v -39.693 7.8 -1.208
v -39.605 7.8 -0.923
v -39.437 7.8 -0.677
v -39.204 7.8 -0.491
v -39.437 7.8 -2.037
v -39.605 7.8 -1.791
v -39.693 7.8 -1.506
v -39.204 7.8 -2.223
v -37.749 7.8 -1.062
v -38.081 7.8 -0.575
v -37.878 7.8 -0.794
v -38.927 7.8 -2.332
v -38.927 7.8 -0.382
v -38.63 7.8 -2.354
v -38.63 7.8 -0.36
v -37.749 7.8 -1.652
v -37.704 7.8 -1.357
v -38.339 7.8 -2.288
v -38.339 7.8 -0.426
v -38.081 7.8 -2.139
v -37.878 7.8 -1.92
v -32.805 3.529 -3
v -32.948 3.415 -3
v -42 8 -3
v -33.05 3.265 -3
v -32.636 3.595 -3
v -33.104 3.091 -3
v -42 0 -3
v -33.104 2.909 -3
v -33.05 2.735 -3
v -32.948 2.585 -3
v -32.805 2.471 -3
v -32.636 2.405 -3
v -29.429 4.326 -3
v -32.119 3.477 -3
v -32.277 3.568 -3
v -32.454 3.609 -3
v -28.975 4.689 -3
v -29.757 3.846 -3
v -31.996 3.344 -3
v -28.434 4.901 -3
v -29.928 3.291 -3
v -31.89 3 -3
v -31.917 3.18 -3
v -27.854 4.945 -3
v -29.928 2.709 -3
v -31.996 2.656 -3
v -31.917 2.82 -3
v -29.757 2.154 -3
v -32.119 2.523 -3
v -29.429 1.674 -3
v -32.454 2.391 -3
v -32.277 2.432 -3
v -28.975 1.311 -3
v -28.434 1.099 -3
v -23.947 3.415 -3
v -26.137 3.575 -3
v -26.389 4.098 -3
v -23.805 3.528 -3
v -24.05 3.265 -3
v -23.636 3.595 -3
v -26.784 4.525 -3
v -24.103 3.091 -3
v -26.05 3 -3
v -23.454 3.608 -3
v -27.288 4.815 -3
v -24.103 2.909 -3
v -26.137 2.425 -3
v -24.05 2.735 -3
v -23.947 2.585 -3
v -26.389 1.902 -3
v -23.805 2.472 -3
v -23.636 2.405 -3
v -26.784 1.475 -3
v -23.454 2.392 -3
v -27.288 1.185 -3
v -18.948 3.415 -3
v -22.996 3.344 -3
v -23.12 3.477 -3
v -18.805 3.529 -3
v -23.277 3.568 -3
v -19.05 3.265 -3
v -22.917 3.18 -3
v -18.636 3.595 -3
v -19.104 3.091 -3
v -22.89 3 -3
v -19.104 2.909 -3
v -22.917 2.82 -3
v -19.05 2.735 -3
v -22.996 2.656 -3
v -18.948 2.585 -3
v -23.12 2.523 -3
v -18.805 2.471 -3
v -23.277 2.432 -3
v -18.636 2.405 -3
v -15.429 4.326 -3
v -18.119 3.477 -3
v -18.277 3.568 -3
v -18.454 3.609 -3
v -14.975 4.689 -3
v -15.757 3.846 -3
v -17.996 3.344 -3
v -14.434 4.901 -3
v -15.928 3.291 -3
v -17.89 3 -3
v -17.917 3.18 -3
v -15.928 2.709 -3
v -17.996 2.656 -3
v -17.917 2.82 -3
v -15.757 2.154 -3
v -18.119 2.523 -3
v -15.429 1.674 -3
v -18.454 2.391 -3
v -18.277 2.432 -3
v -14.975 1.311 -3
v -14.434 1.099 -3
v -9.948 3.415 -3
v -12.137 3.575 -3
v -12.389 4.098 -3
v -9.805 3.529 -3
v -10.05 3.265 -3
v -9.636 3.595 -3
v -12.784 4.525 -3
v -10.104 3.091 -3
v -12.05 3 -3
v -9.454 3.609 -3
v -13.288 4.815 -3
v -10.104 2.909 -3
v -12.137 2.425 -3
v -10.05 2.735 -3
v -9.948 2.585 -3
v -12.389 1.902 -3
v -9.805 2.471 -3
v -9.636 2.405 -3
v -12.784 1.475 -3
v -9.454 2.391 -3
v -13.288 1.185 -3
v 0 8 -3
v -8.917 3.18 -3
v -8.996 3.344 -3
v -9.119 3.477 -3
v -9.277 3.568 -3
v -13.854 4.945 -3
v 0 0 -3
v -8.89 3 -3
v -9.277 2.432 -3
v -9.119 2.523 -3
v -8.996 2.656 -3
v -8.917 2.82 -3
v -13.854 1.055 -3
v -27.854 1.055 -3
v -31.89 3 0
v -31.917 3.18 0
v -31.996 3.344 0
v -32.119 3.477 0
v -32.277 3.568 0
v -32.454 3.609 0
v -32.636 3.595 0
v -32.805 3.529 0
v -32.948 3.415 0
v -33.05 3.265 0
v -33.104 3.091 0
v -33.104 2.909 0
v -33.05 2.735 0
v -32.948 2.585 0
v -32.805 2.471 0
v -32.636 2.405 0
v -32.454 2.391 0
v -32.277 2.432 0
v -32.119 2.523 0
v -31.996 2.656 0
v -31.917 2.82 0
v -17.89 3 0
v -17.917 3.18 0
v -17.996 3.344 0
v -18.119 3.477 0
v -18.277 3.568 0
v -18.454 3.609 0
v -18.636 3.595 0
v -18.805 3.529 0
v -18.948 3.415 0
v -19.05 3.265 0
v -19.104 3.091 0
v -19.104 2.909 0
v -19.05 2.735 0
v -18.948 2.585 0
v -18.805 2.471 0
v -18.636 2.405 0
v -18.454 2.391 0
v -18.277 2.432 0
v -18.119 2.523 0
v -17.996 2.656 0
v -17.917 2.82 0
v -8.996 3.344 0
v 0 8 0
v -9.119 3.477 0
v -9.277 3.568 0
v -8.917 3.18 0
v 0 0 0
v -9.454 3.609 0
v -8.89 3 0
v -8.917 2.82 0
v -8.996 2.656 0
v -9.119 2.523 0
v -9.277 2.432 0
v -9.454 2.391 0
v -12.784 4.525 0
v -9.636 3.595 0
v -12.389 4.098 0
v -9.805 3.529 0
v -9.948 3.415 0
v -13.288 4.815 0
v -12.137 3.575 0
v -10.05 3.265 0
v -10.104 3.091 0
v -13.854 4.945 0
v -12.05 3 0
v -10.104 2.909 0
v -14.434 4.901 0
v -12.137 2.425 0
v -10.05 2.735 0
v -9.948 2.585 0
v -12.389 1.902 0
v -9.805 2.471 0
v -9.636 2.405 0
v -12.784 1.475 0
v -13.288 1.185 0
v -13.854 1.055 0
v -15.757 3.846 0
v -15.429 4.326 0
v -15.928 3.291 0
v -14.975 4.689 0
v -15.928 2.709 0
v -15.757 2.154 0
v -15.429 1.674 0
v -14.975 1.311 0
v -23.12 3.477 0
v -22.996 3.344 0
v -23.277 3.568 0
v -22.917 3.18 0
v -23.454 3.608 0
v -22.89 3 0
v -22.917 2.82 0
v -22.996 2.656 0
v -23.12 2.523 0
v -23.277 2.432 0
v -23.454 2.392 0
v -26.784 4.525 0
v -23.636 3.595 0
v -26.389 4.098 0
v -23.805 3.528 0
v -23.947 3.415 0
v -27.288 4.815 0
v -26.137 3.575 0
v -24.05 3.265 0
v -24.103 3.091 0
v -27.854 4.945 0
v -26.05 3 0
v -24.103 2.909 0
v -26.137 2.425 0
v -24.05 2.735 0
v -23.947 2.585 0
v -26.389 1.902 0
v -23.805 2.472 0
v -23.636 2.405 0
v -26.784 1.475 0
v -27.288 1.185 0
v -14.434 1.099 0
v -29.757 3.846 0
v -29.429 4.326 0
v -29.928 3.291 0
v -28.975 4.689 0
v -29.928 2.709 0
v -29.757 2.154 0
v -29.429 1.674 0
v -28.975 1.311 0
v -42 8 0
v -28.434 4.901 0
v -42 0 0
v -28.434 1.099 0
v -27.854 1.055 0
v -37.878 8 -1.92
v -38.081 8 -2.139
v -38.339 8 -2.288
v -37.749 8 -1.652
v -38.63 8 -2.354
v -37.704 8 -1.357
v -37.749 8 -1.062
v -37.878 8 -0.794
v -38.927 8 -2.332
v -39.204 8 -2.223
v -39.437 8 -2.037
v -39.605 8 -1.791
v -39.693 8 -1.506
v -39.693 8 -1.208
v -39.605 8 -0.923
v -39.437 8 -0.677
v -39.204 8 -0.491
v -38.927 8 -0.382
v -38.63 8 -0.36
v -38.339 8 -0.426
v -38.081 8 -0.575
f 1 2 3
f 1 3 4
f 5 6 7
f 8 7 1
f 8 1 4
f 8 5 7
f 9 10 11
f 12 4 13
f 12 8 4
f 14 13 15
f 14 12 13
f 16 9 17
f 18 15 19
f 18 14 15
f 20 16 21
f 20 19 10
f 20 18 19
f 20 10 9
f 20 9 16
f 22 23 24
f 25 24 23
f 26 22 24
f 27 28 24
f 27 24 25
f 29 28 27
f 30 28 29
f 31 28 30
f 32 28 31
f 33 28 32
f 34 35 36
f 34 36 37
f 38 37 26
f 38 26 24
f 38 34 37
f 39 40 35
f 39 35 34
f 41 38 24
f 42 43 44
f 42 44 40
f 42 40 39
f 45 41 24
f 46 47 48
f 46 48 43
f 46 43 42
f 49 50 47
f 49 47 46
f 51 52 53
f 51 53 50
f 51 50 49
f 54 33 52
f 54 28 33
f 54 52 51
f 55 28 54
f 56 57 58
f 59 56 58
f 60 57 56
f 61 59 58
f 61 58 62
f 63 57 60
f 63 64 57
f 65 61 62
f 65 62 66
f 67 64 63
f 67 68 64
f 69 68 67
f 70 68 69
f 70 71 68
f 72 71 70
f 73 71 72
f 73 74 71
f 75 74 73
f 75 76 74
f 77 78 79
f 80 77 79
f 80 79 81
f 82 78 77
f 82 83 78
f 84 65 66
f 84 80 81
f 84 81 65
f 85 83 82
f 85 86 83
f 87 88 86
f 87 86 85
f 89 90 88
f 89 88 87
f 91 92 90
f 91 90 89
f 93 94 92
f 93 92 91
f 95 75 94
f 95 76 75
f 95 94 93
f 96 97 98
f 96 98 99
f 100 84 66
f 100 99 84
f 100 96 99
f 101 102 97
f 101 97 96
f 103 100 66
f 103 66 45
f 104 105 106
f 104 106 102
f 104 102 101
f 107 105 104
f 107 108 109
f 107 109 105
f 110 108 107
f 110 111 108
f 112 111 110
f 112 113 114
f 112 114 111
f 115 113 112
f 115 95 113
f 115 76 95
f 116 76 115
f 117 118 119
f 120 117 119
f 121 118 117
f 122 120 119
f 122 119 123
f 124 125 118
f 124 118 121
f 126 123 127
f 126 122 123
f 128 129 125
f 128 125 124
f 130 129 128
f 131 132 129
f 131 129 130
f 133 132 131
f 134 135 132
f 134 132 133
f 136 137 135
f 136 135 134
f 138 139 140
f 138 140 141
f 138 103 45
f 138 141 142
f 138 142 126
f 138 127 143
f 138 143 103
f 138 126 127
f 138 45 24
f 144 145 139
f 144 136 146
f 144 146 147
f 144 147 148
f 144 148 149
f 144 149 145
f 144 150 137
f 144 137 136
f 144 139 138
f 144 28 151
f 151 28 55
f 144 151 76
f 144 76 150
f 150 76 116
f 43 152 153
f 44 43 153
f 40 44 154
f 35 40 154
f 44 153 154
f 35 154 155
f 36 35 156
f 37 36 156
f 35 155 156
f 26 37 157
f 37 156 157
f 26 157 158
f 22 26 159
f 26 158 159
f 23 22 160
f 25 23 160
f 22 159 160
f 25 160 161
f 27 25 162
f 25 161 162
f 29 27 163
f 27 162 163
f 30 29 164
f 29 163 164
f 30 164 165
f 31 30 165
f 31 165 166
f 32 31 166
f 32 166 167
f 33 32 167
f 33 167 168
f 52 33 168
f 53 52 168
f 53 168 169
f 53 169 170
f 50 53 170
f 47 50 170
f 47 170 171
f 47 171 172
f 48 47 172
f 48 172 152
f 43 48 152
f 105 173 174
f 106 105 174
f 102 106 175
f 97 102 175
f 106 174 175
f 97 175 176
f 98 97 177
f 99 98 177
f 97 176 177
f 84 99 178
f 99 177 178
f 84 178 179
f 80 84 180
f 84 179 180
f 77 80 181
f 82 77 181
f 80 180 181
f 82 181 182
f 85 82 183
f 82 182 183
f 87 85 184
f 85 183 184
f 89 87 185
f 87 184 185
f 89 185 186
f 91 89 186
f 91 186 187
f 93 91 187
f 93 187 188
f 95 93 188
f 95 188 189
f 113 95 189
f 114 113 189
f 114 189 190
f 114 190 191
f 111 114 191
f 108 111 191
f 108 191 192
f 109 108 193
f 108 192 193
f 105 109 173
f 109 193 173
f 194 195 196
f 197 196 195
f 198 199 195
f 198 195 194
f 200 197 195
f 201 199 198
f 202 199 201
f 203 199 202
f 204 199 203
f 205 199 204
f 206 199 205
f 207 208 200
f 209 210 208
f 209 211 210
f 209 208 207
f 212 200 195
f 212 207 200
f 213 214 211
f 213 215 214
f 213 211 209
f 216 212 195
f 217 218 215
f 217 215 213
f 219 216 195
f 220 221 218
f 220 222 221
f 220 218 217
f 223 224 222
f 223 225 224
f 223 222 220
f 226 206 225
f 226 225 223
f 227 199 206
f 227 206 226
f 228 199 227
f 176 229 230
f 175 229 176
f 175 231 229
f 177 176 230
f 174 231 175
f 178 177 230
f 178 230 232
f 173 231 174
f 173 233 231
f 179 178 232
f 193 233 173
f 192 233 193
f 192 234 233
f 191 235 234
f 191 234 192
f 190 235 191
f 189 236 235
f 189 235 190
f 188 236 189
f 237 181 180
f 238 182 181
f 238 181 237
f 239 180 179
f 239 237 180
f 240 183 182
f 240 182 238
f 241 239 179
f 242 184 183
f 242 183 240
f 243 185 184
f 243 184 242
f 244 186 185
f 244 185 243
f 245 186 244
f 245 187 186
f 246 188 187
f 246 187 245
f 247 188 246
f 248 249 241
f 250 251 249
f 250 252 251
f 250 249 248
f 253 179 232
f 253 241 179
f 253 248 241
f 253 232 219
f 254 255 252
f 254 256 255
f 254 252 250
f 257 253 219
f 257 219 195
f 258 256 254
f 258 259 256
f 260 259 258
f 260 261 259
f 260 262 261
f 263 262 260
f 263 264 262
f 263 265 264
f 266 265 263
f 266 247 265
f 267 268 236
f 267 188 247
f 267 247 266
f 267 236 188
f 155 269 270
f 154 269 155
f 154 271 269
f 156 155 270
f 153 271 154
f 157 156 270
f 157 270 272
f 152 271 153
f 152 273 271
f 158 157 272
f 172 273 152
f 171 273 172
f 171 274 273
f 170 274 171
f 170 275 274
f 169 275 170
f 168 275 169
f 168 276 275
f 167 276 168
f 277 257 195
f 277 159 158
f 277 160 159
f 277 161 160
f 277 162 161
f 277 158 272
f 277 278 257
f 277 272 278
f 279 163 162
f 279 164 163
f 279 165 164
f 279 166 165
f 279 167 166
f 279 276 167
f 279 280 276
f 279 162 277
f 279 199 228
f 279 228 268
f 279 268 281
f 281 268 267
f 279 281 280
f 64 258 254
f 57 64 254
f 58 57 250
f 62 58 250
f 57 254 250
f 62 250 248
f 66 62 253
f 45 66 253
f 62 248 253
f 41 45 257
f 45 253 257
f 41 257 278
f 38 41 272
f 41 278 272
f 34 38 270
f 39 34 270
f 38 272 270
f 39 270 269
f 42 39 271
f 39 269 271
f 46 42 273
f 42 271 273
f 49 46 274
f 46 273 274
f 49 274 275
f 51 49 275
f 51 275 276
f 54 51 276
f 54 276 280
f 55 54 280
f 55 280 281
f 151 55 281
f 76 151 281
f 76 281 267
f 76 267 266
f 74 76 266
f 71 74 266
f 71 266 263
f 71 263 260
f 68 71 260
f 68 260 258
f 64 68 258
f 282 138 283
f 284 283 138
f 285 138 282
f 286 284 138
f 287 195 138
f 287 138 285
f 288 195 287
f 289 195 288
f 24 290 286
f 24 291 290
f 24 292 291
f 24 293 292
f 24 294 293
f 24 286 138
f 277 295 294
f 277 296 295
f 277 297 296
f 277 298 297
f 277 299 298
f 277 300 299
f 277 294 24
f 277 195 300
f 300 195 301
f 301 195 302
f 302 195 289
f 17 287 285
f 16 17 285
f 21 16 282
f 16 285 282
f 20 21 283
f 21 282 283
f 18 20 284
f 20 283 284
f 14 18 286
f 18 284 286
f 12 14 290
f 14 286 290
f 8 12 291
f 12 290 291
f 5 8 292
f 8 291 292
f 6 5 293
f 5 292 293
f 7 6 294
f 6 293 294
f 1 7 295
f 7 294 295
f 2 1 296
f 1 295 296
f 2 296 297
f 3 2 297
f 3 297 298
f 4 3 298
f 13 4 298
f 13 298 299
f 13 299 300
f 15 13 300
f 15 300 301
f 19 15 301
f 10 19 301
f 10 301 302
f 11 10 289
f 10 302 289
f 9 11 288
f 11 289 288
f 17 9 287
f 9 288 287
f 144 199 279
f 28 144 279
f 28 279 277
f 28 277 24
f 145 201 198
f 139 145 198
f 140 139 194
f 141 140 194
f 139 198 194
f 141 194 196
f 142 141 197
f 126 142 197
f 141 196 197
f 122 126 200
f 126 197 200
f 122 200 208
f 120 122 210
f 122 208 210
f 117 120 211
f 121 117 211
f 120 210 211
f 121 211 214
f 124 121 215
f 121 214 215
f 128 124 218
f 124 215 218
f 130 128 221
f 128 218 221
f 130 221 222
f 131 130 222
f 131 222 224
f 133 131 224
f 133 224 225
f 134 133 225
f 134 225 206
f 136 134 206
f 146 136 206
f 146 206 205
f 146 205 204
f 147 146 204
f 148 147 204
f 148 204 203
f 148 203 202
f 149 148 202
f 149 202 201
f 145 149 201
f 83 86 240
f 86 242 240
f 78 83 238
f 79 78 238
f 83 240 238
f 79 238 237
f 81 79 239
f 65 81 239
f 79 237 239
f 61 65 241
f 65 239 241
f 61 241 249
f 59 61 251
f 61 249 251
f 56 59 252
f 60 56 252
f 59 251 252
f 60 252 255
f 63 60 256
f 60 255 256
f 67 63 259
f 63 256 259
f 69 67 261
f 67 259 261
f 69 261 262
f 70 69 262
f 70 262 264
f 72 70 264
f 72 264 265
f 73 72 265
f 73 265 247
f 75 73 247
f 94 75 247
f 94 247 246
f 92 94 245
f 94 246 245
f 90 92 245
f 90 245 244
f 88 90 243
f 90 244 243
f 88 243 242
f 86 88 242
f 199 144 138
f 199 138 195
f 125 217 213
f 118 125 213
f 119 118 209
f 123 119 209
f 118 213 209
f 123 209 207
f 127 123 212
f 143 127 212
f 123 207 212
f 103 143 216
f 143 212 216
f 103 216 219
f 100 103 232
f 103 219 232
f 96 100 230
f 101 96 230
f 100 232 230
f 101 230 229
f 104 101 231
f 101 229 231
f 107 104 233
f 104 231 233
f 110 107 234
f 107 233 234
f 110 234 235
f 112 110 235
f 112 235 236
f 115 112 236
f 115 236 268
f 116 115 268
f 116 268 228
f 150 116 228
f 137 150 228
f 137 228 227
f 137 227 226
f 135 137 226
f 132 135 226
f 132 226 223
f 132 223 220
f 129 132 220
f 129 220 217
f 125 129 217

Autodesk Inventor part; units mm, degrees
ref_plane "YZ Plane" through (0, 0, 0) normal (1, 0, 0) x (0, 1, 0)
ref_plane "XZ Plane" through (0, 0, 0) normal (0, 1, 0) x (-1, 0, 0)
ref_plane "XY Plane" through (0, 0, 0) normal (0, 0, 1) x (1, 0, 0)
sketch "Szkic1" plane through (0, 0, 0) normal (0, 1, 0) x (-1, 0, 0)
  line L0 (0, 0) -> (42, 0)
  line L1 (42, 0) -> (42, -3)
  line L2 (42, -3) -> (0, -3)
  line L3 (0, -3) -> (0, 0)
  dimension "d0" = 42
  dimension "d1" = 3
extrude "Wyciągnięcie proste1" add sketch "Szkic1" along normal blind 8
sketch "Szkic2" plane through (0, 8, 0) normal (0, 1, 0) x (1, 0, 0)
  circle A0 centre (-38.7043, 1.357) radius 1
  point P0 (0, 0)
  dimension "d4" = 2
extrude "Wyciągnięcie proste2" cut sketch "Szkic2" against normal blind 0.2
sketch "Szkic3" plane through (-42, 0, 0) normal (0, 0, 1) x (1, 0, 0)
  line L0 (0, 8) -> (42, 8) projected
  line L1 (0, 8) -> (6, 8)
  line L2 (6, 0) -> (0, 0)
  line L3 (0, 0) -> (0, 8)
  line L4 (42, 0) -> (36, 0)
  line L5 (36, 8) -> (42, 8)
  line L6 (42, 8) -> (42, 0)
  circle A0 centre (9.5, 3) radius 0.6105
  line L7 (0, 0) -> (42, 0) projected
  circle A1 centre (18.5, 3) radius 0.61
  circle A2 centre (23.5, 3) radius 0.6105
  circle A3 centre (32.5, 3) radius 0.6105
  circle A4 centre (14, 3) radius 1.95
  circle A5 centre (28, 3) radius 1.95
  dimension "d7" = 6
  dimension "d8" = 8
  dimension "d9" = 6
  dimension "d10" = 1.221
  dimension "d11" = 3
  dimension "d12" = 1.22
  dimension "d13" = 1.221
  dimension "d14" = 1.221
  dimension "d15" = 3
  dimension "d16" = 3
  dimension "d17" = 3
  dimension "d18" = 9.5
  dimension "d19" = 9.5
  dimension "d20" = 9
  dimension "d21" = 9
  dimension "d22" = 3.9
  dimension "d23" = 3.9
  dimension "d24" = 3
  dimension "d25" = 4.5
  dimension "d26" = 4.5
  dimension "d27" = 3
extrude "Wyciągnięcie proste3" cut sketch "Szkic3" against normal blind 3 contours A0 | A1 | A2 | A3 | A4 | A5
properties part number "blmwall"
